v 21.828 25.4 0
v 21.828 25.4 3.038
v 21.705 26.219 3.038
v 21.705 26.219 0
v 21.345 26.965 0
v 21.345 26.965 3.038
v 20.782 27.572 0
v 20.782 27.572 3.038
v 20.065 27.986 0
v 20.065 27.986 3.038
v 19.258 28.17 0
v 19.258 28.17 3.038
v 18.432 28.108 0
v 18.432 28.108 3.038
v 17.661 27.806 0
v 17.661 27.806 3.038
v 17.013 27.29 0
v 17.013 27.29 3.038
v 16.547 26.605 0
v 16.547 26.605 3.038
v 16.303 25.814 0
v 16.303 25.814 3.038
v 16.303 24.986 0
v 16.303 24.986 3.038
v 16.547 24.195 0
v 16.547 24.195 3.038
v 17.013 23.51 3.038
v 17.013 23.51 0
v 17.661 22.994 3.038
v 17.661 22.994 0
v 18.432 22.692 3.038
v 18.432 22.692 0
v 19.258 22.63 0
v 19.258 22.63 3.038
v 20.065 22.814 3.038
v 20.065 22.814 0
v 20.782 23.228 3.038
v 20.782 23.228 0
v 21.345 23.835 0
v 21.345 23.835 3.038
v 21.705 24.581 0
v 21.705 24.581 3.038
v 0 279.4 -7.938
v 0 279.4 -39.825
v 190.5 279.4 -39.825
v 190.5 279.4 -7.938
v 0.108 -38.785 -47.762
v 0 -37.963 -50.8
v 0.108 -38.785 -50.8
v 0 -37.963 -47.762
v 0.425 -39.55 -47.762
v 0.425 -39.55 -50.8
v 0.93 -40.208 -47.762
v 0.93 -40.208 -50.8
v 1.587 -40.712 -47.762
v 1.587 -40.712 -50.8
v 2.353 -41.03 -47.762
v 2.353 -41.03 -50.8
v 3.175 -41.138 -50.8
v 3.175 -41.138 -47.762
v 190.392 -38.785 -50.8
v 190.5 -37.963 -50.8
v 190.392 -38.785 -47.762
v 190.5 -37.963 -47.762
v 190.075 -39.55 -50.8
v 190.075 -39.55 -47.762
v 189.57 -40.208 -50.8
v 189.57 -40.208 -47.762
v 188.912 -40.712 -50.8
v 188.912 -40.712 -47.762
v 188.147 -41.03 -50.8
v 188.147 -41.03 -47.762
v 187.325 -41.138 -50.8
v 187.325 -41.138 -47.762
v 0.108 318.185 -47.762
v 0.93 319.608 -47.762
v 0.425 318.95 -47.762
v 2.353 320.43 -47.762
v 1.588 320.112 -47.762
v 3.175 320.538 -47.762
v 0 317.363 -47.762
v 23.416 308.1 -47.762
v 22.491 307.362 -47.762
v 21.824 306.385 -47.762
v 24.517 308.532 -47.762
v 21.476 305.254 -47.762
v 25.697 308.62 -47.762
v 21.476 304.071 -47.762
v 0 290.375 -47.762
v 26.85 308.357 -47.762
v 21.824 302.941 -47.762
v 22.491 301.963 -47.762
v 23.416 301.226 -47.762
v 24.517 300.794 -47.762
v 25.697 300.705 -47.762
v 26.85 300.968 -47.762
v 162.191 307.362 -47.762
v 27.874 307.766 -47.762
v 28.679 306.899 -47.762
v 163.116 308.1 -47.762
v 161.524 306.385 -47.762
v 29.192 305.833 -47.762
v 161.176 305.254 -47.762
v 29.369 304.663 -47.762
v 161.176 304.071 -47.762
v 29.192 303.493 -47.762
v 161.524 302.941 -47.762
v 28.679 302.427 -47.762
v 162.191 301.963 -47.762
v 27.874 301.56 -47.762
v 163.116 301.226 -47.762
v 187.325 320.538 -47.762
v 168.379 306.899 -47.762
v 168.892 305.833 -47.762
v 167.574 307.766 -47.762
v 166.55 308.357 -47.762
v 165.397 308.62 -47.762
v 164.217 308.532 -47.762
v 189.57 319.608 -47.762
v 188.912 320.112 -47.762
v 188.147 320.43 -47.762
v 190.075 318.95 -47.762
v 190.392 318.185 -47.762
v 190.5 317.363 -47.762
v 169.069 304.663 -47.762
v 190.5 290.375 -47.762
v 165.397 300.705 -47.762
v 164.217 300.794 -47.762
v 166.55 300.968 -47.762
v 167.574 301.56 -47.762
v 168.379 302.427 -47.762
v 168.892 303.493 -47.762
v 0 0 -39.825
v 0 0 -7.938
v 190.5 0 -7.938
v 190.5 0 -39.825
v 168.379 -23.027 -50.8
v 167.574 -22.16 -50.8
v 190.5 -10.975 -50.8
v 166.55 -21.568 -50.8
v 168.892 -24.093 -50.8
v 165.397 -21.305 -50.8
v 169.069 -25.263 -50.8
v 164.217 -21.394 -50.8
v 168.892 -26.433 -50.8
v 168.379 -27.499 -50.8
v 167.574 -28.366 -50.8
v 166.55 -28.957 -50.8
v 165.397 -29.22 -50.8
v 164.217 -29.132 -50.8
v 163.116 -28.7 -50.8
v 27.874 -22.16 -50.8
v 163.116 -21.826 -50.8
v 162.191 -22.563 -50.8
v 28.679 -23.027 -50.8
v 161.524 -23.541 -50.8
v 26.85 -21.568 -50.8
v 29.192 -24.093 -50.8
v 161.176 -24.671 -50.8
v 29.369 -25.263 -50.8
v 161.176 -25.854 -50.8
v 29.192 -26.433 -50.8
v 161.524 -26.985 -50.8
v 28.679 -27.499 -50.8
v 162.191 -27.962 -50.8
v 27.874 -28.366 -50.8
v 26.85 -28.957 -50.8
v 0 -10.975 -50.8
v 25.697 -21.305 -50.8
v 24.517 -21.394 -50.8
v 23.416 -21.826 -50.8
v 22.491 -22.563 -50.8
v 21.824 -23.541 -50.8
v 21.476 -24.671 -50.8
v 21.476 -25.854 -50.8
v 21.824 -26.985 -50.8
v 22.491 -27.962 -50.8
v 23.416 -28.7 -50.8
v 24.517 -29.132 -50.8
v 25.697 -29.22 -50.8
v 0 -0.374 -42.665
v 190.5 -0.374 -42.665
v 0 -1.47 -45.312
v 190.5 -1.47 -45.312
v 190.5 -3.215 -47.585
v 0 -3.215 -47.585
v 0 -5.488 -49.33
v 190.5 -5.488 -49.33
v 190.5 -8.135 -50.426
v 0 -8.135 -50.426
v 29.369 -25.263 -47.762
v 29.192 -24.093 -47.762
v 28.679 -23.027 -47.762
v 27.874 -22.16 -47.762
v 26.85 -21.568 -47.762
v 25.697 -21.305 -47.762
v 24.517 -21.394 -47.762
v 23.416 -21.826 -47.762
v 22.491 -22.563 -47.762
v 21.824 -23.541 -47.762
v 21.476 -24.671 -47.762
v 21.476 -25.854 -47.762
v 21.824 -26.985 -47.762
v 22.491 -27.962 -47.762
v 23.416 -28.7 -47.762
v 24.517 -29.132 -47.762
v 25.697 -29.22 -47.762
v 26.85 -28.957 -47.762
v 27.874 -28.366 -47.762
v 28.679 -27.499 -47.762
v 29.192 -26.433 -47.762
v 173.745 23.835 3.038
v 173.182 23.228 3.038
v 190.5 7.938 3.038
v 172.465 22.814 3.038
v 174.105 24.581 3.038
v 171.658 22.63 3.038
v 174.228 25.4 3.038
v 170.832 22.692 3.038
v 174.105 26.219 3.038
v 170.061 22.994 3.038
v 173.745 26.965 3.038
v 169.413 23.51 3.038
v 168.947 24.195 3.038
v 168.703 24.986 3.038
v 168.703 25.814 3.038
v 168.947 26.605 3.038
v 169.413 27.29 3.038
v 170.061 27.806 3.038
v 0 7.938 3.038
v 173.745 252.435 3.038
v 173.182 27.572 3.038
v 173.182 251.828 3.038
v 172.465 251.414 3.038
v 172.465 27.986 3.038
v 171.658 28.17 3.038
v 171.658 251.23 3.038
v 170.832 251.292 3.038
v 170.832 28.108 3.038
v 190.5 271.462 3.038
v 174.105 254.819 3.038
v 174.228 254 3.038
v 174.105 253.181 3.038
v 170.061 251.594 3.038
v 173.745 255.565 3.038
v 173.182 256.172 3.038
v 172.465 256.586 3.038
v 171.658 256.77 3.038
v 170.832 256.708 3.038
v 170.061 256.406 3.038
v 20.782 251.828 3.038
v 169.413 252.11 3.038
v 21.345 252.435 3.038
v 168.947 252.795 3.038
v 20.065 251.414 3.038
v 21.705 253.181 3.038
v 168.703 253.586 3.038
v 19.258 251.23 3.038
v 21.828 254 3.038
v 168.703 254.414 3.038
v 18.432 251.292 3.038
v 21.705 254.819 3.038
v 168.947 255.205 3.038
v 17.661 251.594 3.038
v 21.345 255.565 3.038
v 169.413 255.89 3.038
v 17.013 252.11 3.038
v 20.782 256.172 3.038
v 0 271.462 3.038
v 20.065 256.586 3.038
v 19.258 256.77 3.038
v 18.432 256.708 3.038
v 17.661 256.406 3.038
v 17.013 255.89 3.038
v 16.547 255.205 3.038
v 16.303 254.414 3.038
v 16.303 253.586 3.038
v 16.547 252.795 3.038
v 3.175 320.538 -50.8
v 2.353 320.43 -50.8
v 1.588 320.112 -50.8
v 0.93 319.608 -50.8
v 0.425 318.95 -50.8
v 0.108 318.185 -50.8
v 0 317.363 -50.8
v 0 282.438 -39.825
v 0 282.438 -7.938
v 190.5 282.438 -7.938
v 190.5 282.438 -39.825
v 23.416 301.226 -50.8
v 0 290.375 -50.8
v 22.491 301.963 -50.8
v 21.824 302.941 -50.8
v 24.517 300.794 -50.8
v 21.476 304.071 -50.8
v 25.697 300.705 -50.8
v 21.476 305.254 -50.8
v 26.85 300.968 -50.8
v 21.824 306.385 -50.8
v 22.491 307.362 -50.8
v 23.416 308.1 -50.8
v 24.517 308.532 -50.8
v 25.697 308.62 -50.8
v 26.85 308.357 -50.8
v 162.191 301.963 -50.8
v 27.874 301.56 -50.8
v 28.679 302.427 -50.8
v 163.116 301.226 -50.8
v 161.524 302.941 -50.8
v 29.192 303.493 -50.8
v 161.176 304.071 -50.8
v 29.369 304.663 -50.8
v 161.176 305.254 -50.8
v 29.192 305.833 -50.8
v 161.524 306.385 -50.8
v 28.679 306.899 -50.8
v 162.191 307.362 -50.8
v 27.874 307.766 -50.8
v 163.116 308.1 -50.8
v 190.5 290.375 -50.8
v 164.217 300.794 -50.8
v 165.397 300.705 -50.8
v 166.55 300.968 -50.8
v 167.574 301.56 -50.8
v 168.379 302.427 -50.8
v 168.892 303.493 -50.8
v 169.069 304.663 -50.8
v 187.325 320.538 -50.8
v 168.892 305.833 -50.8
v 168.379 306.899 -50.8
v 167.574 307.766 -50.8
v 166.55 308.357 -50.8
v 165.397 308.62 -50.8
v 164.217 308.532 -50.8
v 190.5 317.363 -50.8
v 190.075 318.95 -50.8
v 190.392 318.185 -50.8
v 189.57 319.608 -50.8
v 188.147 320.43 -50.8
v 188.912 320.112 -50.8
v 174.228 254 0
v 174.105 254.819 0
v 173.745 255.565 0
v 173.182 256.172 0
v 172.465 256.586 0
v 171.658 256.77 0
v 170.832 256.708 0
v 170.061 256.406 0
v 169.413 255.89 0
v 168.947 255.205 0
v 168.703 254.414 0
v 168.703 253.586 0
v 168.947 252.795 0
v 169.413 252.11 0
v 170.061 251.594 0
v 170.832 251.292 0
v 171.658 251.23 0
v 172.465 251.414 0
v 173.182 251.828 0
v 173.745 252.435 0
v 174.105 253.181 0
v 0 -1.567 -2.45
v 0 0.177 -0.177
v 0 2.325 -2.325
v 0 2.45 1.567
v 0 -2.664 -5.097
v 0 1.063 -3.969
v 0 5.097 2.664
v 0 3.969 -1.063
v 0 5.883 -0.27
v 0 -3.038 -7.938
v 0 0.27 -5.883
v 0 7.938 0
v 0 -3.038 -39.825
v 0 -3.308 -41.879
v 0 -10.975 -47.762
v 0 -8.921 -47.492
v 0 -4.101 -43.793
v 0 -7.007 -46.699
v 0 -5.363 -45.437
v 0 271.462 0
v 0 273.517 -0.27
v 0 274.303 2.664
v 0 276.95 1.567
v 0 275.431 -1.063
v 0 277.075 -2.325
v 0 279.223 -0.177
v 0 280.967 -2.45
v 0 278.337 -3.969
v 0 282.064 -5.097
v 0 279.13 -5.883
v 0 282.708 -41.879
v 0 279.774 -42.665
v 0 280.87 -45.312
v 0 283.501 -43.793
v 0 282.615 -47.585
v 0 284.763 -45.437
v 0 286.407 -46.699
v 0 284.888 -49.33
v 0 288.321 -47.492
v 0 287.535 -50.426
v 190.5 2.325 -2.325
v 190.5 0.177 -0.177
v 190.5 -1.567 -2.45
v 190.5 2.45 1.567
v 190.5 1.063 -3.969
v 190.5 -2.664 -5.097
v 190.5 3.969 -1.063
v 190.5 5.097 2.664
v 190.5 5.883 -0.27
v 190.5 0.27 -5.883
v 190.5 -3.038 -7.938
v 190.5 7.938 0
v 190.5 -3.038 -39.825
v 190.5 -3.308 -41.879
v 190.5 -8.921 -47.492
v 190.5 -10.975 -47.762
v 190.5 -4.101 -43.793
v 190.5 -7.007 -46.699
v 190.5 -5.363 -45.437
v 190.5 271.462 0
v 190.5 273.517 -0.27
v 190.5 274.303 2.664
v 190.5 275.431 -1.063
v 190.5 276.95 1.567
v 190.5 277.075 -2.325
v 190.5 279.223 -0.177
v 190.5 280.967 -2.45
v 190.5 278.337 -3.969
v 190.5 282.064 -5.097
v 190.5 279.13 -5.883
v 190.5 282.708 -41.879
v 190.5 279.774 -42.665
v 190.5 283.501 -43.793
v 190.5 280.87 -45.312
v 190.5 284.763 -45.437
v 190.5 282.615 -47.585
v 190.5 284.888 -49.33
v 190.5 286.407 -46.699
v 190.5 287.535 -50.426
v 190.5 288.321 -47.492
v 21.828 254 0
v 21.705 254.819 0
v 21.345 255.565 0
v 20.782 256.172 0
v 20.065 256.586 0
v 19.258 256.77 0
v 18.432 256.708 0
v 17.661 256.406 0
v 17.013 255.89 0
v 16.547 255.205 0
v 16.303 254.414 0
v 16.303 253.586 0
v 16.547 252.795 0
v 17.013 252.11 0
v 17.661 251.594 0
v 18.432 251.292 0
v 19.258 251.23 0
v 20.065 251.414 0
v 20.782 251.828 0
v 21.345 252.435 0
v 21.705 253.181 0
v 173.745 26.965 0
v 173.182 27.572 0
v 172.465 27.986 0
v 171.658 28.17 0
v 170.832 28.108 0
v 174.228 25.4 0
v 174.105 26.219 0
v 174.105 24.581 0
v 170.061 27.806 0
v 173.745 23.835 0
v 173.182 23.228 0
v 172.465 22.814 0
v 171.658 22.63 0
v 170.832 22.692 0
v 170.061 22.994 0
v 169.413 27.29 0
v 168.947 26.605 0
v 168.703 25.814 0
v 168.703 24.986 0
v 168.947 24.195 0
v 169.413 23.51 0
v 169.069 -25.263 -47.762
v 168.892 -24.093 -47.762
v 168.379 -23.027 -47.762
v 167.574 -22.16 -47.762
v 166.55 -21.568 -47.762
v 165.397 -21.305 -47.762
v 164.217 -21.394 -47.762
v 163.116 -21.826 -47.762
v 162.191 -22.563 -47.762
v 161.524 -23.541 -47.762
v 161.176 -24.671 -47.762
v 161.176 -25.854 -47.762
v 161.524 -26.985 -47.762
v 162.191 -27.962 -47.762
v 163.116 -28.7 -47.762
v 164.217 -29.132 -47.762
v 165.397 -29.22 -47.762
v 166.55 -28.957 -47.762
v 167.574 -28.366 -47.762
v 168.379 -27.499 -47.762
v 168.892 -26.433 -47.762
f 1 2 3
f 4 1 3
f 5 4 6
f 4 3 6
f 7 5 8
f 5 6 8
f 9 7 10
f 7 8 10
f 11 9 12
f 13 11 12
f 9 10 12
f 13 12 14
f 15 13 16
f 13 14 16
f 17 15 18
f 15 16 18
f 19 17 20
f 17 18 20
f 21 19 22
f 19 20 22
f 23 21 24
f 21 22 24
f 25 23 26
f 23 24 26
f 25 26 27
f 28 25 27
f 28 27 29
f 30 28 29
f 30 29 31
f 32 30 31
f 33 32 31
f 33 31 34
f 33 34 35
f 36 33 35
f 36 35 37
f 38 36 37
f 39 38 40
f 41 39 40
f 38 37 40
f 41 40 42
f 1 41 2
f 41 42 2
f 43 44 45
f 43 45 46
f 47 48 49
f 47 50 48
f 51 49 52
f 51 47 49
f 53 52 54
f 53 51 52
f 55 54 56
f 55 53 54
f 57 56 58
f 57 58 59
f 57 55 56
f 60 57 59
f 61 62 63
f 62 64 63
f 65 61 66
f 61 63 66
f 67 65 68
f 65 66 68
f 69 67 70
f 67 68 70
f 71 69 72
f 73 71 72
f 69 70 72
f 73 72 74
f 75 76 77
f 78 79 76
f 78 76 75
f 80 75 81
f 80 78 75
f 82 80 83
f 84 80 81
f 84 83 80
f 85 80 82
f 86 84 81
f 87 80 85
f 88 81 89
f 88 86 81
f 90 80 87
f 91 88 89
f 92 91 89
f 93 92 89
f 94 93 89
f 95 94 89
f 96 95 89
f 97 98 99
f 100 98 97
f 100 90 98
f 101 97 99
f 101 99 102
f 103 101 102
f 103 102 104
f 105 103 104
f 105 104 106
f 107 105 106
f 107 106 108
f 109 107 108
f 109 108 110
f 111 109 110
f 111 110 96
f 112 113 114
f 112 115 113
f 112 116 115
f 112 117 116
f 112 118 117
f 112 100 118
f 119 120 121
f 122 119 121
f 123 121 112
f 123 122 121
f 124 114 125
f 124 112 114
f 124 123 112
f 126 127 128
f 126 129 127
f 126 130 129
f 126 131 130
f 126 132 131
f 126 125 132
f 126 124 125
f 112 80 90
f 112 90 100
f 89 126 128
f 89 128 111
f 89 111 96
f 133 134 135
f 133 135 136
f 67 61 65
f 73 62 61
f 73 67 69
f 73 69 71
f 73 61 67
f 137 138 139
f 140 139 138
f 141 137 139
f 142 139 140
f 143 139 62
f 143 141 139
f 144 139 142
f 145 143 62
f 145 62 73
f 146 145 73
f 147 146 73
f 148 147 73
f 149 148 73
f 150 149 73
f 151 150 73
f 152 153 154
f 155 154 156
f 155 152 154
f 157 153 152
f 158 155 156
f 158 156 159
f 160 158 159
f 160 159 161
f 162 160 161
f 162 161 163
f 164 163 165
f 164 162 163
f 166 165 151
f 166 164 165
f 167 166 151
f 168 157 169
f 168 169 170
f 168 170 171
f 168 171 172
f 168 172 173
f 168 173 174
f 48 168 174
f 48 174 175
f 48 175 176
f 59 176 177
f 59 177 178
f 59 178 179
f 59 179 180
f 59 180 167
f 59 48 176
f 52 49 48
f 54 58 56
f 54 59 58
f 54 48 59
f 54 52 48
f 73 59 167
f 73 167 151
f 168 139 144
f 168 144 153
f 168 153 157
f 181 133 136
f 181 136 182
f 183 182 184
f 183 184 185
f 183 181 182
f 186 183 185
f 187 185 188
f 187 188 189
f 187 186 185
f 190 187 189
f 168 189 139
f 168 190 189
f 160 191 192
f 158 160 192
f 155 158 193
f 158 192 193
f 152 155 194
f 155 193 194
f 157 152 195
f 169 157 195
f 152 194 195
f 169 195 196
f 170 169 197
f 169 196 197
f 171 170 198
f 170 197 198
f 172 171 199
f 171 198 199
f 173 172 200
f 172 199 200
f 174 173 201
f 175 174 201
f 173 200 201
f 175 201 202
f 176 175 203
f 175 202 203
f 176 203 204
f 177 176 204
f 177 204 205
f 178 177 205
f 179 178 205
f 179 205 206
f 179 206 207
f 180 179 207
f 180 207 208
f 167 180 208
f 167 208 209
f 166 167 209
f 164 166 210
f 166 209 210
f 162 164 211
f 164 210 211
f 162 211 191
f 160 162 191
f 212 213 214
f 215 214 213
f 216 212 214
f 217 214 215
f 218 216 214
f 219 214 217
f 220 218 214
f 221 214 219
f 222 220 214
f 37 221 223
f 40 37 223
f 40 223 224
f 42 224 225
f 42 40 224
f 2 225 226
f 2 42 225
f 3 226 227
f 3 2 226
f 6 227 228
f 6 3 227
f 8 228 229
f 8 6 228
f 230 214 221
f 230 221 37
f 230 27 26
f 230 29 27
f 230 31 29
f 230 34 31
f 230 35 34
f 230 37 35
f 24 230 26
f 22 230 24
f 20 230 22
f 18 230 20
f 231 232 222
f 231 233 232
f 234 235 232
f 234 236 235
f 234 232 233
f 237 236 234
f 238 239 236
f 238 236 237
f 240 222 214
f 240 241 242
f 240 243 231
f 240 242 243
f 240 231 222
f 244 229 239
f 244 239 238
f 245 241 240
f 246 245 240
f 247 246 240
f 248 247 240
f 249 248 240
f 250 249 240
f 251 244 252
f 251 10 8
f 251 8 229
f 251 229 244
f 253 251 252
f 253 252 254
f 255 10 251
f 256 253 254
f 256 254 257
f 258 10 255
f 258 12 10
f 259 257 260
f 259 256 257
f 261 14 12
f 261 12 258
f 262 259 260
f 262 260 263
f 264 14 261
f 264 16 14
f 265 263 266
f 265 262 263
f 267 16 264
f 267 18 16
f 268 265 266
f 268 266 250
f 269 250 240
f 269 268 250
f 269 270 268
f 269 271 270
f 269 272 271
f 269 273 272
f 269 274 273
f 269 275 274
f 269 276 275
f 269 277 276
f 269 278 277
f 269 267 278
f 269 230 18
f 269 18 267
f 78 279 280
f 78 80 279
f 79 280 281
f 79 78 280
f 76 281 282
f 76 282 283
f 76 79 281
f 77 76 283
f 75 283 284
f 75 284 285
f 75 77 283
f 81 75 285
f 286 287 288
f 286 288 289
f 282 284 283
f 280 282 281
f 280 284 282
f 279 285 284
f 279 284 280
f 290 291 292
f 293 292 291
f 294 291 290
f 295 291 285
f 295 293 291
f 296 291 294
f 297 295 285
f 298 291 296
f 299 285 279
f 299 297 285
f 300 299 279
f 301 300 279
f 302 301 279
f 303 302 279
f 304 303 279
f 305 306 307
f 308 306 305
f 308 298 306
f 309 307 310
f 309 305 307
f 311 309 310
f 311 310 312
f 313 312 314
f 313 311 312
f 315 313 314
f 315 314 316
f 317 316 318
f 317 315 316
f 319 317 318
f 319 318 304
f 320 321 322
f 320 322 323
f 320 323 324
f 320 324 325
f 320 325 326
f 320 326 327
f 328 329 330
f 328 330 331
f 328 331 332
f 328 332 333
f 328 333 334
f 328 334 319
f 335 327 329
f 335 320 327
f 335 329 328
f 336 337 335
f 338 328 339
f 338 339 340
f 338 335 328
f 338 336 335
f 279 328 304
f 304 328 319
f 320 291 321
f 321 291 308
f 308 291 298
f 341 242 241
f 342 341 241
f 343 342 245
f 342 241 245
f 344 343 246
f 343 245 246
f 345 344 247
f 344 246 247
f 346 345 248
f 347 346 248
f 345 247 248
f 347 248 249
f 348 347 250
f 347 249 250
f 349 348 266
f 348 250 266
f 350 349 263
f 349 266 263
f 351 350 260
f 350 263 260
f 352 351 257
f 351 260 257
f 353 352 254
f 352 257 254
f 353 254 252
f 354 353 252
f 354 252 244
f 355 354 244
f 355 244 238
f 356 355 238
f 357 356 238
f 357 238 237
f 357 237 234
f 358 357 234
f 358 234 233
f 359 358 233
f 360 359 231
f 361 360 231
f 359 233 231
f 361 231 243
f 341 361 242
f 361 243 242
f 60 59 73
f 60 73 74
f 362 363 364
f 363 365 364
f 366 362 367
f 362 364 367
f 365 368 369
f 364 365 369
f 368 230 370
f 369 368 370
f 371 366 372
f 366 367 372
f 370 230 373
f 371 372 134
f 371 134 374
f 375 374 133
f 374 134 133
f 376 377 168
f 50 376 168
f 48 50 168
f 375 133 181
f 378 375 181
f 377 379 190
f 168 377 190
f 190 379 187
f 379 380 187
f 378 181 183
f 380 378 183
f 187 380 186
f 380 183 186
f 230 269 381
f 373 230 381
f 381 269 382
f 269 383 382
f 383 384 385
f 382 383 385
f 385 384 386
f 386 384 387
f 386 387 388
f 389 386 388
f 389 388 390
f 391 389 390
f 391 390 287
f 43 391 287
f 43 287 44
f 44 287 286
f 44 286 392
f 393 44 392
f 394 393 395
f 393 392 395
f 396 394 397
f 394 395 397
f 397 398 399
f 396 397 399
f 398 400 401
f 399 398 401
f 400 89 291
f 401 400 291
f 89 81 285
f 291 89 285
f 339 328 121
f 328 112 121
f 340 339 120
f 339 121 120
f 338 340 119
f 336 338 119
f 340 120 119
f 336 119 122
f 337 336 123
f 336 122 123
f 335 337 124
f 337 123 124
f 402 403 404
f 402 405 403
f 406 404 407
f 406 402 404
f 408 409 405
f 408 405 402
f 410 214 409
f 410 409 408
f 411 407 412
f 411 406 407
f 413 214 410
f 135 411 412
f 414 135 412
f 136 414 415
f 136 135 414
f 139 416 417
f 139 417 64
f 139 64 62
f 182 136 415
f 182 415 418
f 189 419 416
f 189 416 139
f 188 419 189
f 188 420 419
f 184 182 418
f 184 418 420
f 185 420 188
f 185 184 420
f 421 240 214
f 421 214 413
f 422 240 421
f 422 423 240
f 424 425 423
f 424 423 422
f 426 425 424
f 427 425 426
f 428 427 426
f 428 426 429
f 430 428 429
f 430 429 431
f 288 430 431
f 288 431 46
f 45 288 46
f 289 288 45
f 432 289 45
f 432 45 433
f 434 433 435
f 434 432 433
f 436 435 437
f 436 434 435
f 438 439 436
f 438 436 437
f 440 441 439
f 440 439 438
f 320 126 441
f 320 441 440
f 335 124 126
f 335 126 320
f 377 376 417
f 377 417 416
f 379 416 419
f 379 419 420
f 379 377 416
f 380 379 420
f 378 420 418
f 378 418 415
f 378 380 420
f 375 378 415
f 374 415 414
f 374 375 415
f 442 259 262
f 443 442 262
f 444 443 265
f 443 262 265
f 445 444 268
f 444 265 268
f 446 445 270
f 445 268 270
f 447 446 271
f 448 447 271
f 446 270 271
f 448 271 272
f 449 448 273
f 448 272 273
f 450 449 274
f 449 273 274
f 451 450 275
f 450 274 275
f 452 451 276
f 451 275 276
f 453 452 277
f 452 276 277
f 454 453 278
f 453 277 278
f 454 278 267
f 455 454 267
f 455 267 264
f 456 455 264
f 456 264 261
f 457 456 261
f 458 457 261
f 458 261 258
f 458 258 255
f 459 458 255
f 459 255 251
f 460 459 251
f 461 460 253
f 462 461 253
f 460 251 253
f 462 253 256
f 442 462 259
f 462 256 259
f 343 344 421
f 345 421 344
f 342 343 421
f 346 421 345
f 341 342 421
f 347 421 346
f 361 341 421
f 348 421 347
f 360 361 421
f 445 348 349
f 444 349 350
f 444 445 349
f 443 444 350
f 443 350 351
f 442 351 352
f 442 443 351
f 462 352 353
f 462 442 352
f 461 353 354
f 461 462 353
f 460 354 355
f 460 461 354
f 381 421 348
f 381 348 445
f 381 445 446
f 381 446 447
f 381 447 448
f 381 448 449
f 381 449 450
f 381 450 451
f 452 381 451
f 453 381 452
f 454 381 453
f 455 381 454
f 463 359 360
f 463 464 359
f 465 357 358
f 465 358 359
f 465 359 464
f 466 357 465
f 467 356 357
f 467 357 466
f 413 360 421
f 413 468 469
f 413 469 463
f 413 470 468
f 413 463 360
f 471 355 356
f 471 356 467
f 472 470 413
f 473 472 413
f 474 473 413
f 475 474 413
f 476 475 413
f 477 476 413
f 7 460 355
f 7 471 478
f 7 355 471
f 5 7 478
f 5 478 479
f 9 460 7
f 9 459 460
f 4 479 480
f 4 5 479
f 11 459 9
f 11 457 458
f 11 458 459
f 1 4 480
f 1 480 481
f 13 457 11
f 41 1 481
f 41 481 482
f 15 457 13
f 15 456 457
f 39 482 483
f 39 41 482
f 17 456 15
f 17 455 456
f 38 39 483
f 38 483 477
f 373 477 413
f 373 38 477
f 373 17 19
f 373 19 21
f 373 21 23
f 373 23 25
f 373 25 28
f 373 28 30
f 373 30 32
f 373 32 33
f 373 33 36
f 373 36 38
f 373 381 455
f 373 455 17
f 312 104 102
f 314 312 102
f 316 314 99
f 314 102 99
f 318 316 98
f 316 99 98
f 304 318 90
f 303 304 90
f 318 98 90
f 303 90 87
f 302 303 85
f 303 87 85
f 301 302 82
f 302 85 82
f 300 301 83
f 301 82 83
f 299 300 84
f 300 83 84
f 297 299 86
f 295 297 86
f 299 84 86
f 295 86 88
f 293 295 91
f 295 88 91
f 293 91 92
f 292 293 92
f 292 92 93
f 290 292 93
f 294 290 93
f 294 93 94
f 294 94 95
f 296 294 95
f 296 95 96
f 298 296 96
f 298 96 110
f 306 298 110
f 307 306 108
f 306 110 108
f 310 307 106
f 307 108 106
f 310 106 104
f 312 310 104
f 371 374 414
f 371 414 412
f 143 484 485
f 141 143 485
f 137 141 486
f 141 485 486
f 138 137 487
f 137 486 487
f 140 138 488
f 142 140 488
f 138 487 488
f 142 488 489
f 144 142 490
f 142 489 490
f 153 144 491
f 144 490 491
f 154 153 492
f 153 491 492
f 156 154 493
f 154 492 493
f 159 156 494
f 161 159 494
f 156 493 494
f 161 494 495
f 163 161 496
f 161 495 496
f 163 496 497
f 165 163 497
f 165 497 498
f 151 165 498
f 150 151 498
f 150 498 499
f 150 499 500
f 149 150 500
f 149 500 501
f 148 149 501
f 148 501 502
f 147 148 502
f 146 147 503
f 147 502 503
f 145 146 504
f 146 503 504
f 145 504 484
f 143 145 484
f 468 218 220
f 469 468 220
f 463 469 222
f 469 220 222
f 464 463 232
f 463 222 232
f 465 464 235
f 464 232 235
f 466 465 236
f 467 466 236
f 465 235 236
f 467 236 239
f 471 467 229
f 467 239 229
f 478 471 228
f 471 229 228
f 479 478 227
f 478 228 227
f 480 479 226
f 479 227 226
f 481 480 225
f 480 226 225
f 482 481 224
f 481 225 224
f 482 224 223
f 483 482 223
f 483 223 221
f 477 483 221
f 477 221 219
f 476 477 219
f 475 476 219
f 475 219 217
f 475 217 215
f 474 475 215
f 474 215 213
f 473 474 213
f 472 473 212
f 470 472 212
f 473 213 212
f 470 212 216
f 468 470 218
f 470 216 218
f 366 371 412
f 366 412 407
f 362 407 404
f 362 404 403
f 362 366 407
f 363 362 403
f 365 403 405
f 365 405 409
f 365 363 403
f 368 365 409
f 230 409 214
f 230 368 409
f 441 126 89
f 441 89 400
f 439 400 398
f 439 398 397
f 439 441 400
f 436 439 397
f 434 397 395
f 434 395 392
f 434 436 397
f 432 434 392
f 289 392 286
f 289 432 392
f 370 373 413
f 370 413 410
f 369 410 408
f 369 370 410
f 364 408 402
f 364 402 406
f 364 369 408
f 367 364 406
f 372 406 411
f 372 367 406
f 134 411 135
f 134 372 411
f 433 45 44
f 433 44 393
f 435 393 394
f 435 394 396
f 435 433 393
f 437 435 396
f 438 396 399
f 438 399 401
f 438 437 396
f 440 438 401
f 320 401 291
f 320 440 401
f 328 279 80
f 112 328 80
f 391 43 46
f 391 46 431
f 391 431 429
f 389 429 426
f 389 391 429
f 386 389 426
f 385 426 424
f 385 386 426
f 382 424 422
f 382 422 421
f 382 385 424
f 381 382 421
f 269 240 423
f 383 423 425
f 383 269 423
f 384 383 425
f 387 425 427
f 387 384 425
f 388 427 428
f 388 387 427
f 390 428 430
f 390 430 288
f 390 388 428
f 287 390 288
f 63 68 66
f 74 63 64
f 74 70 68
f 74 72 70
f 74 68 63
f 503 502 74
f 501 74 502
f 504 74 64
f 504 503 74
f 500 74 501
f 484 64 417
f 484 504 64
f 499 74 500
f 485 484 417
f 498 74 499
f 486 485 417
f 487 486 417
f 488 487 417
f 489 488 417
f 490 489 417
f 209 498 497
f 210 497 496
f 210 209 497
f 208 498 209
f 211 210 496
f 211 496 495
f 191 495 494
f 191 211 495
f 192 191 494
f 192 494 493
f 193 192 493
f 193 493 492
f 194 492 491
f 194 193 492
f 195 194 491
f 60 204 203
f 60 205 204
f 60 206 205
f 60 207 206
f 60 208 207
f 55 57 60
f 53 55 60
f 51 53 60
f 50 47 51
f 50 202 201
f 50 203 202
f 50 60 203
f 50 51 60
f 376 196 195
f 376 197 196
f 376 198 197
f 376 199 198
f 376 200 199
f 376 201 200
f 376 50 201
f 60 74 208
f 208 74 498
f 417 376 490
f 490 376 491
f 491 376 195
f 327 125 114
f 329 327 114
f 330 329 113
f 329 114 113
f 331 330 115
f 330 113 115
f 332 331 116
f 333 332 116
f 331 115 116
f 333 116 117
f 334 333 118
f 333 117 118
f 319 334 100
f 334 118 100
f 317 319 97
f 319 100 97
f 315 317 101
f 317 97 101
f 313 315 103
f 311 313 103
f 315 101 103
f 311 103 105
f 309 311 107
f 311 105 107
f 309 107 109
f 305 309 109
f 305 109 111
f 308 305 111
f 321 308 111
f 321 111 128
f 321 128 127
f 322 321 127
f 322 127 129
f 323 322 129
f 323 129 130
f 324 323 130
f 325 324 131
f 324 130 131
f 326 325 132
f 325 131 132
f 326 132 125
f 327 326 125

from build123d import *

# Parameters (mm, degrees)
BASE_FLANGE1_DEPTH           = 190.5
SKETCH3_R                    = 2.778125
CUT_EXTRUDE1_DEPTH           = 3.03784
EDGE_FLANGE1_STRIP_W         = 28.02636
EDGE_FLANGE1_STRIP_H         = 3.03784
EDGE_FLANGE1_STRIP_CUT_DEPTH = 190.5
EDGE_FLANGE1_DEPTH           = 190.5
EDGE_FLANGE2_STRIP_W         = 28.02636
EDGE_FLANGE2_STRIP_H         = 3.03784
EDGE_FLANGE2_STRIP_CUT_DEPTH = 190.5
EDGE_FLANGE2_DEPTH           = 190.5
FILLET1_R                    = 3.175
SKETCH12_R                   = 3.96875
CUT_EXTRUDE2_DEPTH           = 3.03784


# Sheet-metal steps are written as plain solids
with BuildPart() as part:
    # Sketch1 → Base-Flange1 (new body)
    with BuildSketch(Plane(origin=(0, 0, 0), x_dir=(0, 0, -1), z_dir=(1, 0, 0))):
        with BuildLine():
            Line((50.8, 279.4), (7.9375, 279.4))
            ThreePointArc((7.9375, 279.4), (2.324839924, 277.075160076), (0, 271.4625))
            Line((0, 271.4625), (0, 7.9375))
            ThreePointArc((0, 7.9375), (2.324839924, 2.324839924), (7.9375, 0))
            Line((7.9375, 0), (50.8, 0))
            Line((50.8, 0), (50.8, -3.03784))
            Line((50.8, -3.03784), (7.9375, -3.03784))
            ThreePointArc((7.9375, -3.03784), (0.17676266, 0.17676266), (-3.03784, 7.9375))
            Line((-3.03784, 7.9375), (-3.03784, 271.4625))
            ThreePointArc((-3.03784, 271.4625), (0.17676266, 279.22323734), (7.9375, 282.43784))
            Line((7.9375, 282.43784), (50.8, 282.43784))
            Line((50.8, 282.43784), (50.8, 279.4))
        make_face()
    extrude(amount=BASE_FLANGE1_DEPTH)

    # Sketch3 → Cut-Extrude1 (cut)
    with BuildSketch(Plane.XY.offset(3.03784)):
        with Locations((171.45, 254)):
            Circle(SKETCH3_R)
        with Locations((19.05, 254)):
            Circle(SKETCH3_R)
        with Locations((171.45, 25.4)):
            Circle(SKETCH3_R)
        with Locations((19.05, 25.4)):
            Circle(SKETCH3_R)
    extrude(amount=-CUT_EXTRUDE1_DEPTH, mode=Mode.SUBTRACT)

    # Edge-Flange1 strip (across the edge) → Edge-Flange1 strip cut (cut)
    with BuildSketch(Plane(origin=(0, -3.03784, -50.8), x_dir=(0, 0, 1), z_dir=(1, 0, 0))):
        with Locations((-3.03784, -1.51892)):
            Rectangle(EDGE_FLANGE1_STRIP_W, EDGE_FLANGE1_STRIP_H)
    extrude(amount=EDGE_FLANGE1_STRIP_CUT_DEPTH, mode=Mode.SUBTRACT)

    # Edge-Flange1 section (across the edge) → Edge-Flange1 (add)
    with BuildSketch(Plane(origin=(0, -3.03784, -50.8), x_dir=(0, 0, 1), z_dir=(1, 0, 0))):
        with BuildLine():
            Line((0, 7.9375), (0, 38.1))
            Line((0, 38.1), (3.03784, 38.1))
            Line((3.03784, 38.1), (3.03784, 7.9375))
            ThreePointArc((3.03784, 7.9375), (5.362679924, 2.324839924), (10.97534, 0))
            Line((10.97534, 0), (10.97534, -3.03784))
            ThreePointArc((10.97534, -3.03784), (3.21460266, 0.17676266), (0, 7.9375))
        make_face()
    extrude(amount=EDGE_FLANGE1_DEPTH)

    # Edge-Flange2 strip (across the edge) → Edge-Flange2 strip cut (cut)
    with BuildSketch(Plane(origin=(190.5, 282.43784, -50.8), x_dir=(0, 0, 1), z_dir=(-1, 0, 0))):
        with Locations((-3.03784, -1.51892)):
            Rectangle(EDGE_FLANGE2_STRIP_W, EDGE_FLANGE2_STRIP_H)
    extrude(amount=EDGE_FLANGE2_STRIP_CUT_DEPTH, mode=Mode.SUBTRACT)

    # Edge-Flange2 section (across the edge) → Edge-Flange2 (add)
    with BuildSketch(Plane(origin=(190.5, 282.43784, -50.8), x_dir=(0, 0, 1), z_dir=(-1, 0, 0))):
        with BuildLine():
            Line((0, 7.9375), (0, 38.1))
            Line((0, 38.1), (3.03784, 38.1))
            Line((3.03784, 38.1), (3.03784, 7.9375))
            ThreePointArc((3.03784, 7.9375), (5.362679924, 2.324839924), (10.97534, 0))
            Line((10.97534, 0), (10.97534, -3.03784))
            ThreePointArc((10.97534, -3.03784), (3.21460266, 0.17676266), (0, 7.9375))
        make_face()
    extrude(amount=EDGE_FLANGE2_DEPTH)

    # Fillet1
    fillet1_edges = [part.edges().sort_by_distance(p)[0] for p in [
        (190.5, 320.53784, -49.28108),
        (0, 320.53784, -49.28108),
        (0, -41.13784, -49.28108),
        (190.5, -41.13784, -49.28108),
    ]]
    fillet(fillet1_edges, radius=FILLET1_R)

    # Sketch12 → Cut-Extrude2 (cut)
    with BuildSketch(Plane.XY.offset(-47.76216)):
        with Locations((25.4, 304.66284)):
            Circle(SKETCH12_R)
        with Locations((165.1, 304.66284)):
            Circle(SKETCH12_R)
        with Locations((165.1, -25.26284)):
            Circle(SKETCH12_R)
        with Locations((25.4, -25.26284)):
            Circle(SKETCH12_R)
    extrude(amount=-CUT_EXTRUDE2_DEPTH, mode=Mode.SUBTRACT)


solid = part.part
